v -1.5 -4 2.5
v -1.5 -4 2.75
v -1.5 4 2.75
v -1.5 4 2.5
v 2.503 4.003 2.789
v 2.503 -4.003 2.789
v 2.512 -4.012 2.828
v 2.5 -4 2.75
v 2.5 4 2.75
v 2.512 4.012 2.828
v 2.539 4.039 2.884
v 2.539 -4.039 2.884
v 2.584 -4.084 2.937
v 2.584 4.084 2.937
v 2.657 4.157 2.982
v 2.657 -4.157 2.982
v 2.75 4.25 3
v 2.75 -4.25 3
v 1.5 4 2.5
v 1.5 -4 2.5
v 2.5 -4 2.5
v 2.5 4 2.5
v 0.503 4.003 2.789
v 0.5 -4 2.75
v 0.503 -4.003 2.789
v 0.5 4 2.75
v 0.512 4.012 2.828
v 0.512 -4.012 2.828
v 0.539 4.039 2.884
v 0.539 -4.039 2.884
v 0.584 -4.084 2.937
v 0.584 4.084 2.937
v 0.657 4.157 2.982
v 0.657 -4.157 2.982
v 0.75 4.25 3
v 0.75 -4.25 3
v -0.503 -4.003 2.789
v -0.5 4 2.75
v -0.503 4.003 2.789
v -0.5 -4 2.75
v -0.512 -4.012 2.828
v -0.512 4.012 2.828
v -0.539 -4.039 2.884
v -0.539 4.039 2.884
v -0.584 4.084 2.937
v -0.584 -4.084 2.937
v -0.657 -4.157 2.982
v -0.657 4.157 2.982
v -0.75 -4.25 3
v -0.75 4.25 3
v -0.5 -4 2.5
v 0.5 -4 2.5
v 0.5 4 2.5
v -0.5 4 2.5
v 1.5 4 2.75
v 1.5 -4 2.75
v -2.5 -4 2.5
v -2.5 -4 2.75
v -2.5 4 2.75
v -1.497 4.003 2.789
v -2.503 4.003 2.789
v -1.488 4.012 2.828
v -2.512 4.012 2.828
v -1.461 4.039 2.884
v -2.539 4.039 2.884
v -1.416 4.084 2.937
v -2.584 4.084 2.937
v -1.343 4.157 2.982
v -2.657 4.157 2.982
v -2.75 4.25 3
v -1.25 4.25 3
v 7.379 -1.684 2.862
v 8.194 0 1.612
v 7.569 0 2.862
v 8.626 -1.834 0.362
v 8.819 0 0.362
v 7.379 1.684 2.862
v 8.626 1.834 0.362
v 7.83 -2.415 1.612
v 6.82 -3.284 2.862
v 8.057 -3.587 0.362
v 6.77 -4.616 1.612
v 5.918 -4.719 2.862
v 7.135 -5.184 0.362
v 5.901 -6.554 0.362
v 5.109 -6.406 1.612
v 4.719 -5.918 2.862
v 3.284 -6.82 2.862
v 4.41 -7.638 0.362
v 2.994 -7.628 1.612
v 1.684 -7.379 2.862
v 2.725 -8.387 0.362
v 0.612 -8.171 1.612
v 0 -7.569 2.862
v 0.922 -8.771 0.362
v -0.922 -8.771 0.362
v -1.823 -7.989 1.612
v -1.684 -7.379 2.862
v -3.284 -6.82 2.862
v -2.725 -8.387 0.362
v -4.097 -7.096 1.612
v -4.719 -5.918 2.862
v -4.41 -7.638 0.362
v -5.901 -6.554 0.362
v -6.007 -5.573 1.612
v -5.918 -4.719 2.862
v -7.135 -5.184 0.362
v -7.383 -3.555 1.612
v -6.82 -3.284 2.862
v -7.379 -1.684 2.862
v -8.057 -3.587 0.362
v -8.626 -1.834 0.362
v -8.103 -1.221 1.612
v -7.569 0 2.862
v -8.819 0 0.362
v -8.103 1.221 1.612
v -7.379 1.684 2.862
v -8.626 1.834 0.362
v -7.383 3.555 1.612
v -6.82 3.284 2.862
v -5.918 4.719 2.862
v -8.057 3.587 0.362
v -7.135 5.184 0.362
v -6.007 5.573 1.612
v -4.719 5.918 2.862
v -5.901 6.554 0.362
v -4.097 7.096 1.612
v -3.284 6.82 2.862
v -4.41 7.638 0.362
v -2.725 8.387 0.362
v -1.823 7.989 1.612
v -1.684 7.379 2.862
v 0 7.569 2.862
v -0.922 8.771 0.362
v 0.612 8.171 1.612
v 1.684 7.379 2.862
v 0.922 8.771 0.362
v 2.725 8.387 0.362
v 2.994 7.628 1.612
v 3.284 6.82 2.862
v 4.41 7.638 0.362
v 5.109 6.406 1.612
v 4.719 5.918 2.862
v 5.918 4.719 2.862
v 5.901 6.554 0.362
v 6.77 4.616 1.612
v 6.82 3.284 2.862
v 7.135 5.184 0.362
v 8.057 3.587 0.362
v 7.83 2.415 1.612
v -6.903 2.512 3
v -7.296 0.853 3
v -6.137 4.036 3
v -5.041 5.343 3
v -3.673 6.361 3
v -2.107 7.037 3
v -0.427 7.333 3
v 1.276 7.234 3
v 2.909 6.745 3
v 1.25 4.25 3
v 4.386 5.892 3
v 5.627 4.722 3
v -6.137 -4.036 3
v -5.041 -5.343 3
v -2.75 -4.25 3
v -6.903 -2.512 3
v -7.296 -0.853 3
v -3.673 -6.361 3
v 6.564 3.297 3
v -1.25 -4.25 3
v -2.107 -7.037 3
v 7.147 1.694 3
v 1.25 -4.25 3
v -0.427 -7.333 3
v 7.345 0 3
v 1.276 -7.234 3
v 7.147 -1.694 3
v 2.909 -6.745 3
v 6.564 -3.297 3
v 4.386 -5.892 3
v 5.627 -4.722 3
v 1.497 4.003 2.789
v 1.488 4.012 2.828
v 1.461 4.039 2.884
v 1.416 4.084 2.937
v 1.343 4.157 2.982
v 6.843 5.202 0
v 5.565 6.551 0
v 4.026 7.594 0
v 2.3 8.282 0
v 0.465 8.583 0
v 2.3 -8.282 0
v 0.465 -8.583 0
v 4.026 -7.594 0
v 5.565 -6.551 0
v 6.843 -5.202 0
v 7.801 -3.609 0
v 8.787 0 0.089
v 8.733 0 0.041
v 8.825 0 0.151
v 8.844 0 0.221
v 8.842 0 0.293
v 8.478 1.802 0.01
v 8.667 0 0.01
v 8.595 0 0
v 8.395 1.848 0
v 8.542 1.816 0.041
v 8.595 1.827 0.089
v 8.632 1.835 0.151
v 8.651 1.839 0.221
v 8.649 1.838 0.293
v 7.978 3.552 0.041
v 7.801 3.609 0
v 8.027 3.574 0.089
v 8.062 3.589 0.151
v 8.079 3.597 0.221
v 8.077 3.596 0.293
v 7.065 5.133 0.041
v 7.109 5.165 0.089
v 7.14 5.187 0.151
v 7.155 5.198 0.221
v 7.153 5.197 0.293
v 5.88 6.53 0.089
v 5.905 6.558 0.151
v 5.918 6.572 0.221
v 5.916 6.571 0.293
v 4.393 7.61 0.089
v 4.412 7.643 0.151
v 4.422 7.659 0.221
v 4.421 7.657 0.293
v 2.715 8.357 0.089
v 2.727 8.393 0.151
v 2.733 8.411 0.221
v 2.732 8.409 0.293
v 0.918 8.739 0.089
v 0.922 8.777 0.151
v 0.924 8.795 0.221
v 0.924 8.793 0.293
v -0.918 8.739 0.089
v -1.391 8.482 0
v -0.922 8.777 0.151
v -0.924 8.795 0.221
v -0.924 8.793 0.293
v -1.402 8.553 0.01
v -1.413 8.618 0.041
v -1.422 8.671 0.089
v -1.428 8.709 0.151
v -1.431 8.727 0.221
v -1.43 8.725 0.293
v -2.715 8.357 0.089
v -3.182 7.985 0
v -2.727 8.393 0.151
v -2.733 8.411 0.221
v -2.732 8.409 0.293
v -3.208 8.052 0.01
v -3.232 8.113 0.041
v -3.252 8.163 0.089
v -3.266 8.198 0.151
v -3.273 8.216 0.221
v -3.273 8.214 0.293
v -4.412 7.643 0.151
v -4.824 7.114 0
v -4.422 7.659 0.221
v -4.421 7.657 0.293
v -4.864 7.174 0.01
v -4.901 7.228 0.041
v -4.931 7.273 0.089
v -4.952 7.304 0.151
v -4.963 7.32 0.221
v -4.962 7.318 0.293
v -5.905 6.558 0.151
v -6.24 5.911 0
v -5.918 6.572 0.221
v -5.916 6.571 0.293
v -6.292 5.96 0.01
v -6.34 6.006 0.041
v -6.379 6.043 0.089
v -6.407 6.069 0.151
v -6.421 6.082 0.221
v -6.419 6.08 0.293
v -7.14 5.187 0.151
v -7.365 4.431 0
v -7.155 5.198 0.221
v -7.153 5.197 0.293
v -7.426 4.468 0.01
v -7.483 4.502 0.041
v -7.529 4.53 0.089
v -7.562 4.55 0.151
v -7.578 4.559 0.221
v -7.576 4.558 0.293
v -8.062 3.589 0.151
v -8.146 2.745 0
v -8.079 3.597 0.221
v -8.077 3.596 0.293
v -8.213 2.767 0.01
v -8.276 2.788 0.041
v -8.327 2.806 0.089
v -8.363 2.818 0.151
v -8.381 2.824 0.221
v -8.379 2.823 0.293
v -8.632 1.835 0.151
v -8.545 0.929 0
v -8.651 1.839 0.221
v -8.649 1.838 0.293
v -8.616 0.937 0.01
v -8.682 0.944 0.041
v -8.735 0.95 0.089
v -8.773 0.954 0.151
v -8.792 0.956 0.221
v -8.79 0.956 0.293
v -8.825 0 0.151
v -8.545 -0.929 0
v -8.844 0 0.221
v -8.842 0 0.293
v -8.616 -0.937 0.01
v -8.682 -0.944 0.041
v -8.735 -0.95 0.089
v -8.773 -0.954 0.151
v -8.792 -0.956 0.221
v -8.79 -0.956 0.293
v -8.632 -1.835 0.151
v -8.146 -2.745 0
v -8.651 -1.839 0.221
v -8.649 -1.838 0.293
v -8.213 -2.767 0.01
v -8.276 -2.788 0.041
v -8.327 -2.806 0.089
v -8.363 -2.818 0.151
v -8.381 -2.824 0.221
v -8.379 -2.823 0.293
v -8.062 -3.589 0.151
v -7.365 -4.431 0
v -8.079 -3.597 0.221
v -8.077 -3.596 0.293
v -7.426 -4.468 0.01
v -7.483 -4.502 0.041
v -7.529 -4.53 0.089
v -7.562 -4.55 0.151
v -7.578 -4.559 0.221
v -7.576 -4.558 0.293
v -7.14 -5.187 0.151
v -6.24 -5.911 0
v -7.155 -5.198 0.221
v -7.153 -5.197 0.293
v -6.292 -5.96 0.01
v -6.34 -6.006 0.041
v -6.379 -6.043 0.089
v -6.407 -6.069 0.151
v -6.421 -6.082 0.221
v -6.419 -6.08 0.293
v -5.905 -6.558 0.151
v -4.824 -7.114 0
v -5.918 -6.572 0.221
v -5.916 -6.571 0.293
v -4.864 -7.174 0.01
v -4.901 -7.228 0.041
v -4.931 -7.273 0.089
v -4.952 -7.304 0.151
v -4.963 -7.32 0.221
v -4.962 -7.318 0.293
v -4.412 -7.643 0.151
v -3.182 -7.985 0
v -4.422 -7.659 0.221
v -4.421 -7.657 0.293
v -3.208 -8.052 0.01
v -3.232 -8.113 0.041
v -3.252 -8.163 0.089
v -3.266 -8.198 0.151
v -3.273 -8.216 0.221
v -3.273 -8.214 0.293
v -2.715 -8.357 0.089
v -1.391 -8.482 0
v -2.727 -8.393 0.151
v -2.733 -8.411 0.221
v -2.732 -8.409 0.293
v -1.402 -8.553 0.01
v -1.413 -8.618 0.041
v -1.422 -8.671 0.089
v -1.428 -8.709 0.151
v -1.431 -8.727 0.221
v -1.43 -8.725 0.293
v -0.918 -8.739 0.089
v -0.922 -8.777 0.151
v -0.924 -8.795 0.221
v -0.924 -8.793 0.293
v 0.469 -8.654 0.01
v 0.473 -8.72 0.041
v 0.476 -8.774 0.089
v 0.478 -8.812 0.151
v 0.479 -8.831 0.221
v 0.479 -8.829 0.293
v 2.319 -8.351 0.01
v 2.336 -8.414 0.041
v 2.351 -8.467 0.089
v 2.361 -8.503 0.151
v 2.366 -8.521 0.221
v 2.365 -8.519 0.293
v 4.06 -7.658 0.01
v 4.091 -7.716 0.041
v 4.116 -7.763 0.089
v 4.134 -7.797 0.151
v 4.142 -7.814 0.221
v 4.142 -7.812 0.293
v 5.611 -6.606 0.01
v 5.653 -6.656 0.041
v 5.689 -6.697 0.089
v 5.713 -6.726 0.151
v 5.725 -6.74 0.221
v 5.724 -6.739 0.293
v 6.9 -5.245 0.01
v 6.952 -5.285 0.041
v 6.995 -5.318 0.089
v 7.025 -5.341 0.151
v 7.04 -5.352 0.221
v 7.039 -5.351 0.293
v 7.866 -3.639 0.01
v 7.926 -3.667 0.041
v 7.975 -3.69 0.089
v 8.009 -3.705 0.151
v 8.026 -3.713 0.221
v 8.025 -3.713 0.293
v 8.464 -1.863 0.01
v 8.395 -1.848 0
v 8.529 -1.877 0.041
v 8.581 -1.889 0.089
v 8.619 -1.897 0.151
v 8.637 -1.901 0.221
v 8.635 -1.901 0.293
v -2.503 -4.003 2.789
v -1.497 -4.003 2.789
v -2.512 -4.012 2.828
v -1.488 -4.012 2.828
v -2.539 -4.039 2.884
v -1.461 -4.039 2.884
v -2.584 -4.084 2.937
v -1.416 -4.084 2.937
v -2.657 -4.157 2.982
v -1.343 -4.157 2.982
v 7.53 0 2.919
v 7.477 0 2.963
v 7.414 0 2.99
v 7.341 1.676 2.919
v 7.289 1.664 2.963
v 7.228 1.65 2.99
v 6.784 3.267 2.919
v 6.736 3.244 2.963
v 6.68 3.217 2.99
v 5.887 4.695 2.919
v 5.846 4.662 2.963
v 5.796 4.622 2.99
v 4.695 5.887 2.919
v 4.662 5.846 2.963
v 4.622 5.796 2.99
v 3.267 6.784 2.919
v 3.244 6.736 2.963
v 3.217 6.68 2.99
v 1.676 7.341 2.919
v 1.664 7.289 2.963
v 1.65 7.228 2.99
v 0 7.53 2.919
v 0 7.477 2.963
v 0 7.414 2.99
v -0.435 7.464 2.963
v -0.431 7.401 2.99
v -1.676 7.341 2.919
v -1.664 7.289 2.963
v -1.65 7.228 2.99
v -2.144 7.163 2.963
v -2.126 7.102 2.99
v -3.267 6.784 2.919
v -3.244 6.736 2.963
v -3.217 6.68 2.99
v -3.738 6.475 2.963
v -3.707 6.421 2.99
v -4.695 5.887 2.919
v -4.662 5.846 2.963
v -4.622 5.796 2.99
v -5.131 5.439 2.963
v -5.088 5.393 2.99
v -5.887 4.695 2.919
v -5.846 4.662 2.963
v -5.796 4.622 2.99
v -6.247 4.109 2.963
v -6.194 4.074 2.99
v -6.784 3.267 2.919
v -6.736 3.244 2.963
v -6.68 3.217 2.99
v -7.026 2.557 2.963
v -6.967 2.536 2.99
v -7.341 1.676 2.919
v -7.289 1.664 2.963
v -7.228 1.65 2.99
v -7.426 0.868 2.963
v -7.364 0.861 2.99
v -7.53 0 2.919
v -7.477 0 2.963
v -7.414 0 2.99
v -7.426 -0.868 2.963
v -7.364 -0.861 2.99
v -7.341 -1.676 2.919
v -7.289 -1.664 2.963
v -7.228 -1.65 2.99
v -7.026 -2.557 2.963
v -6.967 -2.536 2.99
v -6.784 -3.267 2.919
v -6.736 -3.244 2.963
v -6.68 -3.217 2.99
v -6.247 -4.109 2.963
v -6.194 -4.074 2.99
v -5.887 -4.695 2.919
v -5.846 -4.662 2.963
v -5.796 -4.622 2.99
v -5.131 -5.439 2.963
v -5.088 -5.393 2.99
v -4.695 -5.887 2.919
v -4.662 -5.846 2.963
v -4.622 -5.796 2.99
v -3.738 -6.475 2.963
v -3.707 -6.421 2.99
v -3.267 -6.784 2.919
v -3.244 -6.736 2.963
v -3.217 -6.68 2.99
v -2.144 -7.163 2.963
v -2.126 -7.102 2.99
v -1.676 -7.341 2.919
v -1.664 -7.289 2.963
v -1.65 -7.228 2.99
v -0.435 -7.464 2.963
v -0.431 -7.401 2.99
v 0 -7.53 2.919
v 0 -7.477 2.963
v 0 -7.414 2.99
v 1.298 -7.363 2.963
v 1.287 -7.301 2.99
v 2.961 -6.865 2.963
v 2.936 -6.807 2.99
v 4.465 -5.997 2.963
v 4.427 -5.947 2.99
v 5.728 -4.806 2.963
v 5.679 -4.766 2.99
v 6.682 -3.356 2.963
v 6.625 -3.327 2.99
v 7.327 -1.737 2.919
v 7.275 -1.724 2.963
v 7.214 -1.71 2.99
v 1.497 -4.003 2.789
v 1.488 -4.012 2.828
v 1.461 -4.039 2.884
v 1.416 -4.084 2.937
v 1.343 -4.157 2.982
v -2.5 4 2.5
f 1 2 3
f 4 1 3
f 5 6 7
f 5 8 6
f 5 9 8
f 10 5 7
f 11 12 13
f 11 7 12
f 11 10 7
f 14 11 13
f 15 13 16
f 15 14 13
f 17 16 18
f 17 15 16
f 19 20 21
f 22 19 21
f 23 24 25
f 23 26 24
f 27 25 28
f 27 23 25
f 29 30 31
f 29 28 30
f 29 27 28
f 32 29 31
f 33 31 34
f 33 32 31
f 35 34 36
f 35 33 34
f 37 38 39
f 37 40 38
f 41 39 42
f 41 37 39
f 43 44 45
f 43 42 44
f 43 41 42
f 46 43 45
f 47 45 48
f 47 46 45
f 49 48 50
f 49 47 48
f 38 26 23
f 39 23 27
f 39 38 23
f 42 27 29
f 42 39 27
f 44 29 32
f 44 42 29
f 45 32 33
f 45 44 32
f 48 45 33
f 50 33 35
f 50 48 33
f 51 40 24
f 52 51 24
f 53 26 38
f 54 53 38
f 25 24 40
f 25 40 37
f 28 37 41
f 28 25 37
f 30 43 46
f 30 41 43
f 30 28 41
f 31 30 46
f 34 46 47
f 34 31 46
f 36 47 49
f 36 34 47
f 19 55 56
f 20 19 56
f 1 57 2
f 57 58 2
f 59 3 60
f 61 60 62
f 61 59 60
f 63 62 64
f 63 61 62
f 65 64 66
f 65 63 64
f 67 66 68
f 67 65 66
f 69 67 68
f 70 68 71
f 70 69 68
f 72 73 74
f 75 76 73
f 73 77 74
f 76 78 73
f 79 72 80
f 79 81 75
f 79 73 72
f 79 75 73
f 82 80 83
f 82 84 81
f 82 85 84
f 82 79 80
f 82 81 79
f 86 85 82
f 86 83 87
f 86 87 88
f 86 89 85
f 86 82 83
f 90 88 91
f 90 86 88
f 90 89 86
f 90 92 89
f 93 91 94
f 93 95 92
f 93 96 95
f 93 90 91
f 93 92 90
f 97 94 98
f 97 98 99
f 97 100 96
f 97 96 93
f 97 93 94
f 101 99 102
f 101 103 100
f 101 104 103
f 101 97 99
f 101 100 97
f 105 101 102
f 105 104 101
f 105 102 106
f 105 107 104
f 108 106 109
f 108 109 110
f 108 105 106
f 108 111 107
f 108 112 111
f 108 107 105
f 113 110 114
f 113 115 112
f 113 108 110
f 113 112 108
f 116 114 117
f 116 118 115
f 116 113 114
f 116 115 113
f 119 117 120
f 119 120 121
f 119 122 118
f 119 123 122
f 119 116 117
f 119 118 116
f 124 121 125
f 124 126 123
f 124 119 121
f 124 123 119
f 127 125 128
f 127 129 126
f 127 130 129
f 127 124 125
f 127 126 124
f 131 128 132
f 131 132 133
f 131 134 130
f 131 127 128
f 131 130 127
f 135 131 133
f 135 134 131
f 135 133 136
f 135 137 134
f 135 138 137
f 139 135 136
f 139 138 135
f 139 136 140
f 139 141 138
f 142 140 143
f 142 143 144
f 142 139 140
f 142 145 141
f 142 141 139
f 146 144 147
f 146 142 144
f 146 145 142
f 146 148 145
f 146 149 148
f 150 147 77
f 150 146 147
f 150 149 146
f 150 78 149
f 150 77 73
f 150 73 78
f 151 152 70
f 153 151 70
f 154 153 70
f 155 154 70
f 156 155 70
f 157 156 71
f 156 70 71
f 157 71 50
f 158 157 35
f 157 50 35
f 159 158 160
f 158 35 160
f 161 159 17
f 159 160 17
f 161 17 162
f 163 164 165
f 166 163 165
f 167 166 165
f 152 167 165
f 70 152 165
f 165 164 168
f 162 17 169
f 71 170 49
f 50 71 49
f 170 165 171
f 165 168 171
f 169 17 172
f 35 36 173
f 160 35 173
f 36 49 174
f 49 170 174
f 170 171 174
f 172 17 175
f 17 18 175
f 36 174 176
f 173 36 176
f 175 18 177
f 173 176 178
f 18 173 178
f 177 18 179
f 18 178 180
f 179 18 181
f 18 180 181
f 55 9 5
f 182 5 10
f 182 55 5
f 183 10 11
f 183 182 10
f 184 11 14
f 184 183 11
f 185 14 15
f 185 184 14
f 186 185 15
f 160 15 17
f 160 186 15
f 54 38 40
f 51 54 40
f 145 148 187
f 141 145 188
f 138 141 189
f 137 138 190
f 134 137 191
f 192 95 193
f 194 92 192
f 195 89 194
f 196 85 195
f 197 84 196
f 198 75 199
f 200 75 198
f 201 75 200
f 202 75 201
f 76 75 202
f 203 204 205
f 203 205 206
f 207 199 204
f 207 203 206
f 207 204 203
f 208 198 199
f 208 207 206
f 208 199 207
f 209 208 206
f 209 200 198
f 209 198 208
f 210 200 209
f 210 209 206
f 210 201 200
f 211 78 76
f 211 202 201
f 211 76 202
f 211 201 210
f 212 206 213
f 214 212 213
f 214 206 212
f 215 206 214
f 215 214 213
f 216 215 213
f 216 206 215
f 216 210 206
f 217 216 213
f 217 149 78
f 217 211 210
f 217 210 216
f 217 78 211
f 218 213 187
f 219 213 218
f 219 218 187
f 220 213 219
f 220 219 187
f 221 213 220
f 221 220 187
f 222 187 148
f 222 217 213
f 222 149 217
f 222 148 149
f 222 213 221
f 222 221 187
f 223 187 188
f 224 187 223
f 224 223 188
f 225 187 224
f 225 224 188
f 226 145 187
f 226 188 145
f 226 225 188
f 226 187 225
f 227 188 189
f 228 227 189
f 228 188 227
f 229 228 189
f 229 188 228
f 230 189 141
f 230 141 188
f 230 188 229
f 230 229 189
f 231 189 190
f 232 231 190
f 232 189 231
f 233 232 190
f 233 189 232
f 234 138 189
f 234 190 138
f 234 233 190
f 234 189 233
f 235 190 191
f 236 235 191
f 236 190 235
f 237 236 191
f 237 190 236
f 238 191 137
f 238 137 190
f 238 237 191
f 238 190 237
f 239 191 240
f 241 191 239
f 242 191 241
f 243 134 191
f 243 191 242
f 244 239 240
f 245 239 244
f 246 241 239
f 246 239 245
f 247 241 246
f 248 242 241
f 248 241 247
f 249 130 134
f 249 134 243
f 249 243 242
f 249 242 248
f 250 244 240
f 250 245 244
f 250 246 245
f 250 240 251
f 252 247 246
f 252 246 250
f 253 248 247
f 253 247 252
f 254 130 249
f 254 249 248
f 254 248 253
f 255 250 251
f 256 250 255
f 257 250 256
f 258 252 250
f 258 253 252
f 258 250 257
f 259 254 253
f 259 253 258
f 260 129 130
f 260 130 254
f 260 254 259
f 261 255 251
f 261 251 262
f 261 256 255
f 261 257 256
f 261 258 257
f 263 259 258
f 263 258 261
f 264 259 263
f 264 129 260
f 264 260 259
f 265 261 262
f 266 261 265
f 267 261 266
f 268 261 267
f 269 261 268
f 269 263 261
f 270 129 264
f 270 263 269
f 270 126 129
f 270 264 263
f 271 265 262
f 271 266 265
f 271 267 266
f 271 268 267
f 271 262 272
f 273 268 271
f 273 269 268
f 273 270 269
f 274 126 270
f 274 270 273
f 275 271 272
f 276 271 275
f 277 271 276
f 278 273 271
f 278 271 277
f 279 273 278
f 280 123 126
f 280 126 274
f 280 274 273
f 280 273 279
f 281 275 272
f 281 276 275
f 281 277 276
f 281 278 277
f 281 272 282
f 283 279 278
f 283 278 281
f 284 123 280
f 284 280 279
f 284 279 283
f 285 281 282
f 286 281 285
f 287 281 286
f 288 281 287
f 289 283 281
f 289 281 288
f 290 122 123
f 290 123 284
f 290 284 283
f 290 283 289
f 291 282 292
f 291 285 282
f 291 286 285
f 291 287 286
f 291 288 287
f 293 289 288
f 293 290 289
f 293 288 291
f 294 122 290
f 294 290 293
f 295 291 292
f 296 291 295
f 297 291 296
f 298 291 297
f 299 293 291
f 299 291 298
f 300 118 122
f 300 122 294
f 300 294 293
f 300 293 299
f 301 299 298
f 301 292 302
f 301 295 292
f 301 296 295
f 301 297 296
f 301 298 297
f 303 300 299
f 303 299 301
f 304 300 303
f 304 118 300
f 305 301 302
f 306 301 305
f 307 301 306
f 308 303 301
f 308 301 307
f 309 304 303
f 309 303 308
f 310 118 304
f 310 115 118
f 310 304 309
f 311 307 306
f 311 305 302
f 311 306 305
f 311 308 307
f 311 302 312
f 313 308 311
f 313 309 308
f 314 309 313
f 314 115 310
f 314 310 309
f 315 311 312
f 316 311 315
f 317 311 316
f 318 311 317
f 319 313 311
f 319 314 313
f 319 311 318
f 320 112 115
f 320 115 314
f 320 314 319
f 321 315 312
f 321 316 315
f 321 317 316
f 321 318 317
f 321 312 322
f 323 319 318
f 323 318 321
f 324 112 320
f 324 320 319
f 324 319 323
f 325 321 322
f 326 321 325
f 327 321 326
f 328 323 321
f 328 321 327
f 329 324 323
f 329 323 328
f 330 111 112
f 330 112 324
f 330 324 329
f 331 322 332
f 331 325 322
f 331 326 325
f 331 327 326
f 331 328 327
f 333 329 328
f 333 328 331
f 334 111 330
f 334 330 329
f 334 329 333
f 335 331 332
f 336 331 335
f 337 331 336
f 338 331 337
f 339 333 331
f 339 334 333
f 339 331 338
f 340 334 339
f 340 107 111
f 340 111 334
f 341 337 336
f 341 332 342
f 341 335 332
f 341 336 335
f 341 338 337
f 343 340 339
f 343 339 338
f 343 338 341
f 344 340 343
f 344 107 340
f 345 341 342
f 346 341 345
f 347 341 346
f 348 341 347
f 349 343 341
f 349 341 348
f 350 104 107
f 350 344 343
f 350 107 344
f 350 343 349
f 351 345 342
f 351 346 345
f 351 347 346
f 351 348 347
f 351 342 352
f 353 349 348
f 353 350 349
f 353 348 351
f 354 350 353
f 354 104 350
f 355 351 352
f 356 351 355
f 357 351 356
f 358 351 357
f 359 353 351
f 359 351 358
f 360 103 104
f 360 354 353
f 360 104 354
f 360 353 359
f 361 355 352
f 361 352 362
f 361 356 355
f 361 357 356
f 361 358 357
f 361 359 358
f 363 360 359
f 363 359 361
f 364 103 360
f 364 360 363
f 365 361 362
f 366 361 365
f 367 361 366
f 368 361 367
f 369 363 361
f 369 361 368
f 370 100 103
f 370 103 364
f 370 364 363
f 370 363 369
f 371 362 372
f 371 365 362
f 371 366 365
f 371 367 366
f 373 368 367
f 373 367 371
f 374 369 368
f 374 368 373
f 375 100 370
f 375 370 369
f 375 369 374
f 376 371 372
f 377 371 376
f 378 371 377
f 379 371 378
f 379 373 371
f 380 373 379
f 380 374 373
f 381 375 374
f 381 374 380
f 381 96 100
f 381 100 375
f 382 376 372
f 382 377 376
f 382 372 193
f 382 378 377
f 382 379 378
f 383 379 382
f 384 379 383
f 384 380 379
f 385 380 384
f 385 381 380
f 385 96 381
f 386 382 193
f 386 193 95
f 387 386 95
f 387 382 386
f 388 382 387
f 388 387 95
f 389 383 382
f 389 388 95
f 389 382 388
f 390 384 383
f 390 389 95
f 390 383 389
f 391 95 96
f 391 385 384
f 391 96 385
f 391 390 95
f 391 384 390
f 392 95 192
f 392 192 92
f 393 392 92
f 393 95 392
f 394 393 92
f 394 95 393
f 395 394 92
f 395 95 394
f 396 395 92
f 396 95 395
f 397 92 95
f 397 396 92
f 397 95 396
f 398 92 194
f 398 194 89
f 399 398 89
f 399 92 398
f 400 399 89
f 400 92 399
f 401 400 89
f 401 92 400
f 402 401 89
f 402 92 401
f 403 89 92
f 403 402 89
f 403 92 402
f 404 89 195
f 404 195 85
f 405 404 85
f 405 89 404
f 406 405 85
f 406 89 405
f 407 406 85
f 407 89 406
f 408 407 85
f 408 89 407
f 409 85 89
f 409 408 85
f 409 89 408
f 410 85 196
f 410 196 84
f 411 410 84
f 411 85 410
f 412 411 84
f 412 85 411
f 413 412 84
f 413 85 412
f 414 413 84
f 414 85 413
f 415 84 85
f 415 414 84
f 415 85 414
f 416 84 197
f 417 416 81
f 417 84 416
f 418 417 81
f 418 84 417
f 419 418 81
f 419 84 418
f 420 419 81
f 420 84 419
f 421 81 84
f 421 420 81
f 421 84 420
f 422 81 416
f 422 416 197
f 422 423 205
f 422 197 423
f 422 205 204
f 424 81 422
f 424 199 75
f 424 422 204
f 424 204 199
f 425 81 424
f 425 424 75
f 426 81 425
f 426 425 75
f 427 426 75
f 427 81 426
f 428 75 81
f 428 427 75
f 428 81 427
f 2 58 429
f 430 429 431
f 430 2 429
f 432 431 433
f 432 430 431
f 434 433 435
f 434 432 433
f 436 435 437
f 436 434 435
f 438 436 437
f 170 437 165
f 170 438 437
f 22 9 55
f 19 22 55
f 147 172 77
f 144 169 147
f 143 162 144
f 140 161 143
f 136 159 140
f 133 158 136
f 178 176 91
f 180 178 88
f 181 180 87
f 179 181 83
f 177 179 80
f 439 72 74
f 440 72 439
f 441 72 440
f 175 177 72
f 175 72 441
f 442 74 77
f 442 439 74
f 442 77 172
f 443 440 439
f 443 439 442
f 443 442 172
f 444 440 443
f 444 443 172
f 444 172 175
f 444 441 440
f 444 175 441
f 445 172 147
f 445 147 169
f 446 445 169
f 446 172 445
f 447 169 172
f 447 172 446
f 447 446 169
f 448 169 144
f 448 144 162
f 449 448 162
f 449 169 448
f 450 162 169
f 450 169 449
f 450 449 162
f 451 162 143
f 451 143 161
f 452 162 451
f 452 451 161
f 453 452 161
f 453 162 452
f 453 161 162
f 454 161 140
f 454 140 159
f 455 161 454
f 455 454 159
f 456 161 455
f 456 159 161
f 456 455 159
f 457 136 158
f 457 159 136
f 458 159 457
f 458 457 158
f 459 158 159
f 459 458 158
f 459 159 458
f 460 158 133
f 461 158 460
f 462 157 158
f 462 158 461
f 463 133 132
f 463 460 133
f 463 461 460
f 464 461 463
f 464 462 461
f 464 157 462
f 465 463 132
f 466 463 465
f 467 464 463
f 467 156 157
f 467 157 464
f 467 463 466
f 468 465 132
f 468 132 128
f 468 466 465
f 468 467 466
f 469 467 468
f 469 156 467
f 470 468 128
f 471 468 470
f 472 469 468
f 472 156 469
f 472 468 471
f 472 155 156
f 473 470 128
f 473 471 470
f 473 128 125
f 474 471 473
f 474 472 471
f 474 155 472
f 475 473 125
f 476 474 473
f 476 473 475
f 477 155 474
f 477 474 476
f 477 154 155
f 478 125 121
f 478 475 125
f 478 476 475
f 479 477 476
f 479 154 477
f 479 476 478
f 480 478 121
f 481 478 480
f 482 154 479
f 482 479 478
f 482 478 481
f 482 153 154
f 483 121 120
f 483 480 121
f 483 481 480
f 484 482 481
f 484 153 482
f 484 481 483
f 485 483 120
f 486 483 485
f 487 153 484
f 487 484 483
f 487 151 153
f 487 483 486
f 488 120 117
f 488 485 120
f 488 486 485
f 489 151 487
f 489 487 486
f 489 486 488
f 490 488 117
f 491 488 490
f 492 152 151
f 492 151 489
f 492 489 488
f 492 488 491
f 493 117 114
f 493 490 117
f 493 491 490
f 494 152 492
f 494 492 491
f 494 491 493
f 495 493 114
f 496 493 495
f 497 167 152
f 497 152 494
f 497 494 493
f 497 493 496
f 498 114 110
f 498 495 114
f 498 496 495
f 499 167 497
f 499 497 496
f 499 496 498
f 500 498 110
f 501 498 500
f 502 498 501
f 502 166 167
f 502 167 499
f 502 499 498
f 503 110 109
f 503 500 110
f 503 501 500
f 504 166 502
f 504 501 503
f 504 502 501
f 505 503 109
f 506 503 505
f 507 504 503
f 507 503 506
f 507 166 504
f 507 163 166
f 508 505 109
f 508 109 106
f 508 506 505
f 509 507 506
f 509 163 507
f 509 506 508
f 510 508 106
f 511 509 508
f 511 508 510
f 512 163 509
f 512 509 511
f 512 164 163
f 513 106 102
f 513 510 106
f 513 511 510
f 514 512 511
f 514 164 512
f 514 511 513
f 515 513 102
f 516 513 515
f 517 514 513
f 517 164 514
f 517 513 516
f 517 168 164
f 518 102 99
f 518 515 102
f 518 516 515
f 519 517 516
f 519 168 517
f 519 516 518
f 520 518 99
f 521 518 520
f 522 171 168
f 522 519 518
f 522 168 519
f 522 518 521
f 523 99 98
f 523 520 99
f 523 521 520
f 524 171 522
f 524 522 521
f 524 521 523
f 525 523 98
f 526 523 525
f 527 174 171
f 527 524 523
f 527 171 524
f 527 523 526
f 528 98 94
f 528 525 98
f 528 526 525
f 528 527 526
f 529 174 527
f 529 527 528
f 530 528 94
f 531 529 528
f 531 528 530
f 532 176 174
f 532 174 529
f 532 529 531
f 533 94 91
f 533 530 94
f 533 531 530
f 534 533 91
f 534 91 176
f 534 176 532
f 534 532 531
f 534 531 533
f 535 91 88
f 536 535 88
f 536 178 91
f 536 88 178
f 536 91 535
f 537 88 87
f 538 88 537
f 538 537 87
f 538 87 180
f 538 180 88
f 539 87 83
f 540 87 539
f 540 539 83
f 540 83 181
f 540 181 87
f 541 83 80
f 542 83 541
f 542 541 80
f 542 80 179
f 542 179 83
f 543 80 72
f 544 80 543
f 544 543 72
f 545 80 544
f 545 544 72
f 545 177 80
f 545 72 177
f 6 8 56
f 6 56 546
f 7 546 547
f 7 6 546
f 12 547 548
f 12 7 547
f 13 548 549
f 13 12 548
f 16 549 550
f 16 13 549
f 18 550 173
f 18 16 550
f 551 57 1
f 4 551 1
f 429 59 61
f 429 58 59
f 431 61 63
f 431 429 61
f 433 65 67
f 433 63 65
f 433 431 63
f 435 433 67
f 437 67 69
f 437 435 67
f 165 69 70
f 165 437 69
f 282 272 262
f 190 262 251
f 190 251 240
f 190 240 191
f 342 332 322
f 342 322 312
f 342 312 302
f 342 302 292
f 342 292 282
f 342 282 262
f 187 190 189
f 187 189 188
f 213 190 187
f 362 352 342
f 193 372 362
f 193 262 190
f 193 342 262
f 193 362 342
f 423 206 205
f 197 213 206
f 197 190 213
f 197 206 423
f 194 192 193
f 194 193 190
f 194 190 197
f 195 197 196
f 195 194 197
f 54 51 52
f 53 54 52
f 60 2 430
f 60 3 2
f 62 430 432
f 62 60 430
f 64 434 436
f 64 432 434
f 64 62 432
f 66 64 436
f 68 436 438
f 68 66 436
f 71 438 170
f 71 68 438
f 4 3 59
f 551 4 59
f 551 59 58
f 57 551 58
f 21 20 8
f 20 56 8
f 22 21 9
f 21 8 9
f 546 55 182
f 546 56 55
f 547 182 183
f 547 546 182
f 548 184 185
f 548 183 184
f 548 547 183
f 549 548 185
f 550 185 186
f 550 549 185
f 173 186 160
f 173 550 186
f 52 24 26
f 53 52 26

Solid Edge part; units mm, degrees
sketch "Sketch1" plane through (0, 0, 0) normal (0, -1, 0) x (1, 0, 0)
  line L0 (0, 0) -> (9, 0)
  line L1 (9, 0) -> (7.5, 3)
  line L2 (7.5, 3) -> (0, 3)
  dimension "D1" = 9
  dimension "D2" = 3
  dimension "D3" = 7.5
revolve "RevolvedProtrusion1" add sketch "Sketch1" angle 360 about axis through (0, 0, 3) along (0, 0, -1)
sketch "Sketch2" plane through (0, 0, 3) normal (0, 0, 1) x (1, 0, 0)
  line L0 (-0.5, -4) -> (0.5, -4)
  line L1 (0.5, -4) -> (0.5, 4)
  line L2 (0.5, 4) -> (-0.5, 4)
  line L3 (-0.5, 4) -> (-0.5, -4)
  line L4 (1.5, -4) -> (2.5, -4)
  line L5 (2.5, -4) -> (2.5, 4)
  line L6 (2.5, 4) -> (1.5, 4)
  line L7 (1.5, 4) -> (1.5, -4)
  line L8 (-2.5, -4) -> (-1.5, -4)
  line L9 (-1.5, -4) -> (-1.5, 4)
  line L10 (-1.5, 4) -> (-2.5, 4)
  line L11 (-2.5, 4) -> (-2.5, -4)
  dimension "D1" = 1
  dimension "D2" = 8
  dimension "D3" = 2
  dimension "D4" = 2
extrude "Cutout1" cut sketch "Sketch2" against normal blind 0.5
fillet "main_rounds" radius 0.25 14 edges at (-9, 0, 0) (-7.5, 0, 3) (0.5, 0, 3) (0, -4, 3) (-0.5, 0, 3) (0, 4, 3) (-2.5, 0, 3) (-1.5, 0, 3) (-2, 4, 3) (-2, -4, 3) (2, -4, 3) (1.5, 0, 3) (2.5, 0, 3) (2, 4, 3)
properties material "Polyethylene, low density"
